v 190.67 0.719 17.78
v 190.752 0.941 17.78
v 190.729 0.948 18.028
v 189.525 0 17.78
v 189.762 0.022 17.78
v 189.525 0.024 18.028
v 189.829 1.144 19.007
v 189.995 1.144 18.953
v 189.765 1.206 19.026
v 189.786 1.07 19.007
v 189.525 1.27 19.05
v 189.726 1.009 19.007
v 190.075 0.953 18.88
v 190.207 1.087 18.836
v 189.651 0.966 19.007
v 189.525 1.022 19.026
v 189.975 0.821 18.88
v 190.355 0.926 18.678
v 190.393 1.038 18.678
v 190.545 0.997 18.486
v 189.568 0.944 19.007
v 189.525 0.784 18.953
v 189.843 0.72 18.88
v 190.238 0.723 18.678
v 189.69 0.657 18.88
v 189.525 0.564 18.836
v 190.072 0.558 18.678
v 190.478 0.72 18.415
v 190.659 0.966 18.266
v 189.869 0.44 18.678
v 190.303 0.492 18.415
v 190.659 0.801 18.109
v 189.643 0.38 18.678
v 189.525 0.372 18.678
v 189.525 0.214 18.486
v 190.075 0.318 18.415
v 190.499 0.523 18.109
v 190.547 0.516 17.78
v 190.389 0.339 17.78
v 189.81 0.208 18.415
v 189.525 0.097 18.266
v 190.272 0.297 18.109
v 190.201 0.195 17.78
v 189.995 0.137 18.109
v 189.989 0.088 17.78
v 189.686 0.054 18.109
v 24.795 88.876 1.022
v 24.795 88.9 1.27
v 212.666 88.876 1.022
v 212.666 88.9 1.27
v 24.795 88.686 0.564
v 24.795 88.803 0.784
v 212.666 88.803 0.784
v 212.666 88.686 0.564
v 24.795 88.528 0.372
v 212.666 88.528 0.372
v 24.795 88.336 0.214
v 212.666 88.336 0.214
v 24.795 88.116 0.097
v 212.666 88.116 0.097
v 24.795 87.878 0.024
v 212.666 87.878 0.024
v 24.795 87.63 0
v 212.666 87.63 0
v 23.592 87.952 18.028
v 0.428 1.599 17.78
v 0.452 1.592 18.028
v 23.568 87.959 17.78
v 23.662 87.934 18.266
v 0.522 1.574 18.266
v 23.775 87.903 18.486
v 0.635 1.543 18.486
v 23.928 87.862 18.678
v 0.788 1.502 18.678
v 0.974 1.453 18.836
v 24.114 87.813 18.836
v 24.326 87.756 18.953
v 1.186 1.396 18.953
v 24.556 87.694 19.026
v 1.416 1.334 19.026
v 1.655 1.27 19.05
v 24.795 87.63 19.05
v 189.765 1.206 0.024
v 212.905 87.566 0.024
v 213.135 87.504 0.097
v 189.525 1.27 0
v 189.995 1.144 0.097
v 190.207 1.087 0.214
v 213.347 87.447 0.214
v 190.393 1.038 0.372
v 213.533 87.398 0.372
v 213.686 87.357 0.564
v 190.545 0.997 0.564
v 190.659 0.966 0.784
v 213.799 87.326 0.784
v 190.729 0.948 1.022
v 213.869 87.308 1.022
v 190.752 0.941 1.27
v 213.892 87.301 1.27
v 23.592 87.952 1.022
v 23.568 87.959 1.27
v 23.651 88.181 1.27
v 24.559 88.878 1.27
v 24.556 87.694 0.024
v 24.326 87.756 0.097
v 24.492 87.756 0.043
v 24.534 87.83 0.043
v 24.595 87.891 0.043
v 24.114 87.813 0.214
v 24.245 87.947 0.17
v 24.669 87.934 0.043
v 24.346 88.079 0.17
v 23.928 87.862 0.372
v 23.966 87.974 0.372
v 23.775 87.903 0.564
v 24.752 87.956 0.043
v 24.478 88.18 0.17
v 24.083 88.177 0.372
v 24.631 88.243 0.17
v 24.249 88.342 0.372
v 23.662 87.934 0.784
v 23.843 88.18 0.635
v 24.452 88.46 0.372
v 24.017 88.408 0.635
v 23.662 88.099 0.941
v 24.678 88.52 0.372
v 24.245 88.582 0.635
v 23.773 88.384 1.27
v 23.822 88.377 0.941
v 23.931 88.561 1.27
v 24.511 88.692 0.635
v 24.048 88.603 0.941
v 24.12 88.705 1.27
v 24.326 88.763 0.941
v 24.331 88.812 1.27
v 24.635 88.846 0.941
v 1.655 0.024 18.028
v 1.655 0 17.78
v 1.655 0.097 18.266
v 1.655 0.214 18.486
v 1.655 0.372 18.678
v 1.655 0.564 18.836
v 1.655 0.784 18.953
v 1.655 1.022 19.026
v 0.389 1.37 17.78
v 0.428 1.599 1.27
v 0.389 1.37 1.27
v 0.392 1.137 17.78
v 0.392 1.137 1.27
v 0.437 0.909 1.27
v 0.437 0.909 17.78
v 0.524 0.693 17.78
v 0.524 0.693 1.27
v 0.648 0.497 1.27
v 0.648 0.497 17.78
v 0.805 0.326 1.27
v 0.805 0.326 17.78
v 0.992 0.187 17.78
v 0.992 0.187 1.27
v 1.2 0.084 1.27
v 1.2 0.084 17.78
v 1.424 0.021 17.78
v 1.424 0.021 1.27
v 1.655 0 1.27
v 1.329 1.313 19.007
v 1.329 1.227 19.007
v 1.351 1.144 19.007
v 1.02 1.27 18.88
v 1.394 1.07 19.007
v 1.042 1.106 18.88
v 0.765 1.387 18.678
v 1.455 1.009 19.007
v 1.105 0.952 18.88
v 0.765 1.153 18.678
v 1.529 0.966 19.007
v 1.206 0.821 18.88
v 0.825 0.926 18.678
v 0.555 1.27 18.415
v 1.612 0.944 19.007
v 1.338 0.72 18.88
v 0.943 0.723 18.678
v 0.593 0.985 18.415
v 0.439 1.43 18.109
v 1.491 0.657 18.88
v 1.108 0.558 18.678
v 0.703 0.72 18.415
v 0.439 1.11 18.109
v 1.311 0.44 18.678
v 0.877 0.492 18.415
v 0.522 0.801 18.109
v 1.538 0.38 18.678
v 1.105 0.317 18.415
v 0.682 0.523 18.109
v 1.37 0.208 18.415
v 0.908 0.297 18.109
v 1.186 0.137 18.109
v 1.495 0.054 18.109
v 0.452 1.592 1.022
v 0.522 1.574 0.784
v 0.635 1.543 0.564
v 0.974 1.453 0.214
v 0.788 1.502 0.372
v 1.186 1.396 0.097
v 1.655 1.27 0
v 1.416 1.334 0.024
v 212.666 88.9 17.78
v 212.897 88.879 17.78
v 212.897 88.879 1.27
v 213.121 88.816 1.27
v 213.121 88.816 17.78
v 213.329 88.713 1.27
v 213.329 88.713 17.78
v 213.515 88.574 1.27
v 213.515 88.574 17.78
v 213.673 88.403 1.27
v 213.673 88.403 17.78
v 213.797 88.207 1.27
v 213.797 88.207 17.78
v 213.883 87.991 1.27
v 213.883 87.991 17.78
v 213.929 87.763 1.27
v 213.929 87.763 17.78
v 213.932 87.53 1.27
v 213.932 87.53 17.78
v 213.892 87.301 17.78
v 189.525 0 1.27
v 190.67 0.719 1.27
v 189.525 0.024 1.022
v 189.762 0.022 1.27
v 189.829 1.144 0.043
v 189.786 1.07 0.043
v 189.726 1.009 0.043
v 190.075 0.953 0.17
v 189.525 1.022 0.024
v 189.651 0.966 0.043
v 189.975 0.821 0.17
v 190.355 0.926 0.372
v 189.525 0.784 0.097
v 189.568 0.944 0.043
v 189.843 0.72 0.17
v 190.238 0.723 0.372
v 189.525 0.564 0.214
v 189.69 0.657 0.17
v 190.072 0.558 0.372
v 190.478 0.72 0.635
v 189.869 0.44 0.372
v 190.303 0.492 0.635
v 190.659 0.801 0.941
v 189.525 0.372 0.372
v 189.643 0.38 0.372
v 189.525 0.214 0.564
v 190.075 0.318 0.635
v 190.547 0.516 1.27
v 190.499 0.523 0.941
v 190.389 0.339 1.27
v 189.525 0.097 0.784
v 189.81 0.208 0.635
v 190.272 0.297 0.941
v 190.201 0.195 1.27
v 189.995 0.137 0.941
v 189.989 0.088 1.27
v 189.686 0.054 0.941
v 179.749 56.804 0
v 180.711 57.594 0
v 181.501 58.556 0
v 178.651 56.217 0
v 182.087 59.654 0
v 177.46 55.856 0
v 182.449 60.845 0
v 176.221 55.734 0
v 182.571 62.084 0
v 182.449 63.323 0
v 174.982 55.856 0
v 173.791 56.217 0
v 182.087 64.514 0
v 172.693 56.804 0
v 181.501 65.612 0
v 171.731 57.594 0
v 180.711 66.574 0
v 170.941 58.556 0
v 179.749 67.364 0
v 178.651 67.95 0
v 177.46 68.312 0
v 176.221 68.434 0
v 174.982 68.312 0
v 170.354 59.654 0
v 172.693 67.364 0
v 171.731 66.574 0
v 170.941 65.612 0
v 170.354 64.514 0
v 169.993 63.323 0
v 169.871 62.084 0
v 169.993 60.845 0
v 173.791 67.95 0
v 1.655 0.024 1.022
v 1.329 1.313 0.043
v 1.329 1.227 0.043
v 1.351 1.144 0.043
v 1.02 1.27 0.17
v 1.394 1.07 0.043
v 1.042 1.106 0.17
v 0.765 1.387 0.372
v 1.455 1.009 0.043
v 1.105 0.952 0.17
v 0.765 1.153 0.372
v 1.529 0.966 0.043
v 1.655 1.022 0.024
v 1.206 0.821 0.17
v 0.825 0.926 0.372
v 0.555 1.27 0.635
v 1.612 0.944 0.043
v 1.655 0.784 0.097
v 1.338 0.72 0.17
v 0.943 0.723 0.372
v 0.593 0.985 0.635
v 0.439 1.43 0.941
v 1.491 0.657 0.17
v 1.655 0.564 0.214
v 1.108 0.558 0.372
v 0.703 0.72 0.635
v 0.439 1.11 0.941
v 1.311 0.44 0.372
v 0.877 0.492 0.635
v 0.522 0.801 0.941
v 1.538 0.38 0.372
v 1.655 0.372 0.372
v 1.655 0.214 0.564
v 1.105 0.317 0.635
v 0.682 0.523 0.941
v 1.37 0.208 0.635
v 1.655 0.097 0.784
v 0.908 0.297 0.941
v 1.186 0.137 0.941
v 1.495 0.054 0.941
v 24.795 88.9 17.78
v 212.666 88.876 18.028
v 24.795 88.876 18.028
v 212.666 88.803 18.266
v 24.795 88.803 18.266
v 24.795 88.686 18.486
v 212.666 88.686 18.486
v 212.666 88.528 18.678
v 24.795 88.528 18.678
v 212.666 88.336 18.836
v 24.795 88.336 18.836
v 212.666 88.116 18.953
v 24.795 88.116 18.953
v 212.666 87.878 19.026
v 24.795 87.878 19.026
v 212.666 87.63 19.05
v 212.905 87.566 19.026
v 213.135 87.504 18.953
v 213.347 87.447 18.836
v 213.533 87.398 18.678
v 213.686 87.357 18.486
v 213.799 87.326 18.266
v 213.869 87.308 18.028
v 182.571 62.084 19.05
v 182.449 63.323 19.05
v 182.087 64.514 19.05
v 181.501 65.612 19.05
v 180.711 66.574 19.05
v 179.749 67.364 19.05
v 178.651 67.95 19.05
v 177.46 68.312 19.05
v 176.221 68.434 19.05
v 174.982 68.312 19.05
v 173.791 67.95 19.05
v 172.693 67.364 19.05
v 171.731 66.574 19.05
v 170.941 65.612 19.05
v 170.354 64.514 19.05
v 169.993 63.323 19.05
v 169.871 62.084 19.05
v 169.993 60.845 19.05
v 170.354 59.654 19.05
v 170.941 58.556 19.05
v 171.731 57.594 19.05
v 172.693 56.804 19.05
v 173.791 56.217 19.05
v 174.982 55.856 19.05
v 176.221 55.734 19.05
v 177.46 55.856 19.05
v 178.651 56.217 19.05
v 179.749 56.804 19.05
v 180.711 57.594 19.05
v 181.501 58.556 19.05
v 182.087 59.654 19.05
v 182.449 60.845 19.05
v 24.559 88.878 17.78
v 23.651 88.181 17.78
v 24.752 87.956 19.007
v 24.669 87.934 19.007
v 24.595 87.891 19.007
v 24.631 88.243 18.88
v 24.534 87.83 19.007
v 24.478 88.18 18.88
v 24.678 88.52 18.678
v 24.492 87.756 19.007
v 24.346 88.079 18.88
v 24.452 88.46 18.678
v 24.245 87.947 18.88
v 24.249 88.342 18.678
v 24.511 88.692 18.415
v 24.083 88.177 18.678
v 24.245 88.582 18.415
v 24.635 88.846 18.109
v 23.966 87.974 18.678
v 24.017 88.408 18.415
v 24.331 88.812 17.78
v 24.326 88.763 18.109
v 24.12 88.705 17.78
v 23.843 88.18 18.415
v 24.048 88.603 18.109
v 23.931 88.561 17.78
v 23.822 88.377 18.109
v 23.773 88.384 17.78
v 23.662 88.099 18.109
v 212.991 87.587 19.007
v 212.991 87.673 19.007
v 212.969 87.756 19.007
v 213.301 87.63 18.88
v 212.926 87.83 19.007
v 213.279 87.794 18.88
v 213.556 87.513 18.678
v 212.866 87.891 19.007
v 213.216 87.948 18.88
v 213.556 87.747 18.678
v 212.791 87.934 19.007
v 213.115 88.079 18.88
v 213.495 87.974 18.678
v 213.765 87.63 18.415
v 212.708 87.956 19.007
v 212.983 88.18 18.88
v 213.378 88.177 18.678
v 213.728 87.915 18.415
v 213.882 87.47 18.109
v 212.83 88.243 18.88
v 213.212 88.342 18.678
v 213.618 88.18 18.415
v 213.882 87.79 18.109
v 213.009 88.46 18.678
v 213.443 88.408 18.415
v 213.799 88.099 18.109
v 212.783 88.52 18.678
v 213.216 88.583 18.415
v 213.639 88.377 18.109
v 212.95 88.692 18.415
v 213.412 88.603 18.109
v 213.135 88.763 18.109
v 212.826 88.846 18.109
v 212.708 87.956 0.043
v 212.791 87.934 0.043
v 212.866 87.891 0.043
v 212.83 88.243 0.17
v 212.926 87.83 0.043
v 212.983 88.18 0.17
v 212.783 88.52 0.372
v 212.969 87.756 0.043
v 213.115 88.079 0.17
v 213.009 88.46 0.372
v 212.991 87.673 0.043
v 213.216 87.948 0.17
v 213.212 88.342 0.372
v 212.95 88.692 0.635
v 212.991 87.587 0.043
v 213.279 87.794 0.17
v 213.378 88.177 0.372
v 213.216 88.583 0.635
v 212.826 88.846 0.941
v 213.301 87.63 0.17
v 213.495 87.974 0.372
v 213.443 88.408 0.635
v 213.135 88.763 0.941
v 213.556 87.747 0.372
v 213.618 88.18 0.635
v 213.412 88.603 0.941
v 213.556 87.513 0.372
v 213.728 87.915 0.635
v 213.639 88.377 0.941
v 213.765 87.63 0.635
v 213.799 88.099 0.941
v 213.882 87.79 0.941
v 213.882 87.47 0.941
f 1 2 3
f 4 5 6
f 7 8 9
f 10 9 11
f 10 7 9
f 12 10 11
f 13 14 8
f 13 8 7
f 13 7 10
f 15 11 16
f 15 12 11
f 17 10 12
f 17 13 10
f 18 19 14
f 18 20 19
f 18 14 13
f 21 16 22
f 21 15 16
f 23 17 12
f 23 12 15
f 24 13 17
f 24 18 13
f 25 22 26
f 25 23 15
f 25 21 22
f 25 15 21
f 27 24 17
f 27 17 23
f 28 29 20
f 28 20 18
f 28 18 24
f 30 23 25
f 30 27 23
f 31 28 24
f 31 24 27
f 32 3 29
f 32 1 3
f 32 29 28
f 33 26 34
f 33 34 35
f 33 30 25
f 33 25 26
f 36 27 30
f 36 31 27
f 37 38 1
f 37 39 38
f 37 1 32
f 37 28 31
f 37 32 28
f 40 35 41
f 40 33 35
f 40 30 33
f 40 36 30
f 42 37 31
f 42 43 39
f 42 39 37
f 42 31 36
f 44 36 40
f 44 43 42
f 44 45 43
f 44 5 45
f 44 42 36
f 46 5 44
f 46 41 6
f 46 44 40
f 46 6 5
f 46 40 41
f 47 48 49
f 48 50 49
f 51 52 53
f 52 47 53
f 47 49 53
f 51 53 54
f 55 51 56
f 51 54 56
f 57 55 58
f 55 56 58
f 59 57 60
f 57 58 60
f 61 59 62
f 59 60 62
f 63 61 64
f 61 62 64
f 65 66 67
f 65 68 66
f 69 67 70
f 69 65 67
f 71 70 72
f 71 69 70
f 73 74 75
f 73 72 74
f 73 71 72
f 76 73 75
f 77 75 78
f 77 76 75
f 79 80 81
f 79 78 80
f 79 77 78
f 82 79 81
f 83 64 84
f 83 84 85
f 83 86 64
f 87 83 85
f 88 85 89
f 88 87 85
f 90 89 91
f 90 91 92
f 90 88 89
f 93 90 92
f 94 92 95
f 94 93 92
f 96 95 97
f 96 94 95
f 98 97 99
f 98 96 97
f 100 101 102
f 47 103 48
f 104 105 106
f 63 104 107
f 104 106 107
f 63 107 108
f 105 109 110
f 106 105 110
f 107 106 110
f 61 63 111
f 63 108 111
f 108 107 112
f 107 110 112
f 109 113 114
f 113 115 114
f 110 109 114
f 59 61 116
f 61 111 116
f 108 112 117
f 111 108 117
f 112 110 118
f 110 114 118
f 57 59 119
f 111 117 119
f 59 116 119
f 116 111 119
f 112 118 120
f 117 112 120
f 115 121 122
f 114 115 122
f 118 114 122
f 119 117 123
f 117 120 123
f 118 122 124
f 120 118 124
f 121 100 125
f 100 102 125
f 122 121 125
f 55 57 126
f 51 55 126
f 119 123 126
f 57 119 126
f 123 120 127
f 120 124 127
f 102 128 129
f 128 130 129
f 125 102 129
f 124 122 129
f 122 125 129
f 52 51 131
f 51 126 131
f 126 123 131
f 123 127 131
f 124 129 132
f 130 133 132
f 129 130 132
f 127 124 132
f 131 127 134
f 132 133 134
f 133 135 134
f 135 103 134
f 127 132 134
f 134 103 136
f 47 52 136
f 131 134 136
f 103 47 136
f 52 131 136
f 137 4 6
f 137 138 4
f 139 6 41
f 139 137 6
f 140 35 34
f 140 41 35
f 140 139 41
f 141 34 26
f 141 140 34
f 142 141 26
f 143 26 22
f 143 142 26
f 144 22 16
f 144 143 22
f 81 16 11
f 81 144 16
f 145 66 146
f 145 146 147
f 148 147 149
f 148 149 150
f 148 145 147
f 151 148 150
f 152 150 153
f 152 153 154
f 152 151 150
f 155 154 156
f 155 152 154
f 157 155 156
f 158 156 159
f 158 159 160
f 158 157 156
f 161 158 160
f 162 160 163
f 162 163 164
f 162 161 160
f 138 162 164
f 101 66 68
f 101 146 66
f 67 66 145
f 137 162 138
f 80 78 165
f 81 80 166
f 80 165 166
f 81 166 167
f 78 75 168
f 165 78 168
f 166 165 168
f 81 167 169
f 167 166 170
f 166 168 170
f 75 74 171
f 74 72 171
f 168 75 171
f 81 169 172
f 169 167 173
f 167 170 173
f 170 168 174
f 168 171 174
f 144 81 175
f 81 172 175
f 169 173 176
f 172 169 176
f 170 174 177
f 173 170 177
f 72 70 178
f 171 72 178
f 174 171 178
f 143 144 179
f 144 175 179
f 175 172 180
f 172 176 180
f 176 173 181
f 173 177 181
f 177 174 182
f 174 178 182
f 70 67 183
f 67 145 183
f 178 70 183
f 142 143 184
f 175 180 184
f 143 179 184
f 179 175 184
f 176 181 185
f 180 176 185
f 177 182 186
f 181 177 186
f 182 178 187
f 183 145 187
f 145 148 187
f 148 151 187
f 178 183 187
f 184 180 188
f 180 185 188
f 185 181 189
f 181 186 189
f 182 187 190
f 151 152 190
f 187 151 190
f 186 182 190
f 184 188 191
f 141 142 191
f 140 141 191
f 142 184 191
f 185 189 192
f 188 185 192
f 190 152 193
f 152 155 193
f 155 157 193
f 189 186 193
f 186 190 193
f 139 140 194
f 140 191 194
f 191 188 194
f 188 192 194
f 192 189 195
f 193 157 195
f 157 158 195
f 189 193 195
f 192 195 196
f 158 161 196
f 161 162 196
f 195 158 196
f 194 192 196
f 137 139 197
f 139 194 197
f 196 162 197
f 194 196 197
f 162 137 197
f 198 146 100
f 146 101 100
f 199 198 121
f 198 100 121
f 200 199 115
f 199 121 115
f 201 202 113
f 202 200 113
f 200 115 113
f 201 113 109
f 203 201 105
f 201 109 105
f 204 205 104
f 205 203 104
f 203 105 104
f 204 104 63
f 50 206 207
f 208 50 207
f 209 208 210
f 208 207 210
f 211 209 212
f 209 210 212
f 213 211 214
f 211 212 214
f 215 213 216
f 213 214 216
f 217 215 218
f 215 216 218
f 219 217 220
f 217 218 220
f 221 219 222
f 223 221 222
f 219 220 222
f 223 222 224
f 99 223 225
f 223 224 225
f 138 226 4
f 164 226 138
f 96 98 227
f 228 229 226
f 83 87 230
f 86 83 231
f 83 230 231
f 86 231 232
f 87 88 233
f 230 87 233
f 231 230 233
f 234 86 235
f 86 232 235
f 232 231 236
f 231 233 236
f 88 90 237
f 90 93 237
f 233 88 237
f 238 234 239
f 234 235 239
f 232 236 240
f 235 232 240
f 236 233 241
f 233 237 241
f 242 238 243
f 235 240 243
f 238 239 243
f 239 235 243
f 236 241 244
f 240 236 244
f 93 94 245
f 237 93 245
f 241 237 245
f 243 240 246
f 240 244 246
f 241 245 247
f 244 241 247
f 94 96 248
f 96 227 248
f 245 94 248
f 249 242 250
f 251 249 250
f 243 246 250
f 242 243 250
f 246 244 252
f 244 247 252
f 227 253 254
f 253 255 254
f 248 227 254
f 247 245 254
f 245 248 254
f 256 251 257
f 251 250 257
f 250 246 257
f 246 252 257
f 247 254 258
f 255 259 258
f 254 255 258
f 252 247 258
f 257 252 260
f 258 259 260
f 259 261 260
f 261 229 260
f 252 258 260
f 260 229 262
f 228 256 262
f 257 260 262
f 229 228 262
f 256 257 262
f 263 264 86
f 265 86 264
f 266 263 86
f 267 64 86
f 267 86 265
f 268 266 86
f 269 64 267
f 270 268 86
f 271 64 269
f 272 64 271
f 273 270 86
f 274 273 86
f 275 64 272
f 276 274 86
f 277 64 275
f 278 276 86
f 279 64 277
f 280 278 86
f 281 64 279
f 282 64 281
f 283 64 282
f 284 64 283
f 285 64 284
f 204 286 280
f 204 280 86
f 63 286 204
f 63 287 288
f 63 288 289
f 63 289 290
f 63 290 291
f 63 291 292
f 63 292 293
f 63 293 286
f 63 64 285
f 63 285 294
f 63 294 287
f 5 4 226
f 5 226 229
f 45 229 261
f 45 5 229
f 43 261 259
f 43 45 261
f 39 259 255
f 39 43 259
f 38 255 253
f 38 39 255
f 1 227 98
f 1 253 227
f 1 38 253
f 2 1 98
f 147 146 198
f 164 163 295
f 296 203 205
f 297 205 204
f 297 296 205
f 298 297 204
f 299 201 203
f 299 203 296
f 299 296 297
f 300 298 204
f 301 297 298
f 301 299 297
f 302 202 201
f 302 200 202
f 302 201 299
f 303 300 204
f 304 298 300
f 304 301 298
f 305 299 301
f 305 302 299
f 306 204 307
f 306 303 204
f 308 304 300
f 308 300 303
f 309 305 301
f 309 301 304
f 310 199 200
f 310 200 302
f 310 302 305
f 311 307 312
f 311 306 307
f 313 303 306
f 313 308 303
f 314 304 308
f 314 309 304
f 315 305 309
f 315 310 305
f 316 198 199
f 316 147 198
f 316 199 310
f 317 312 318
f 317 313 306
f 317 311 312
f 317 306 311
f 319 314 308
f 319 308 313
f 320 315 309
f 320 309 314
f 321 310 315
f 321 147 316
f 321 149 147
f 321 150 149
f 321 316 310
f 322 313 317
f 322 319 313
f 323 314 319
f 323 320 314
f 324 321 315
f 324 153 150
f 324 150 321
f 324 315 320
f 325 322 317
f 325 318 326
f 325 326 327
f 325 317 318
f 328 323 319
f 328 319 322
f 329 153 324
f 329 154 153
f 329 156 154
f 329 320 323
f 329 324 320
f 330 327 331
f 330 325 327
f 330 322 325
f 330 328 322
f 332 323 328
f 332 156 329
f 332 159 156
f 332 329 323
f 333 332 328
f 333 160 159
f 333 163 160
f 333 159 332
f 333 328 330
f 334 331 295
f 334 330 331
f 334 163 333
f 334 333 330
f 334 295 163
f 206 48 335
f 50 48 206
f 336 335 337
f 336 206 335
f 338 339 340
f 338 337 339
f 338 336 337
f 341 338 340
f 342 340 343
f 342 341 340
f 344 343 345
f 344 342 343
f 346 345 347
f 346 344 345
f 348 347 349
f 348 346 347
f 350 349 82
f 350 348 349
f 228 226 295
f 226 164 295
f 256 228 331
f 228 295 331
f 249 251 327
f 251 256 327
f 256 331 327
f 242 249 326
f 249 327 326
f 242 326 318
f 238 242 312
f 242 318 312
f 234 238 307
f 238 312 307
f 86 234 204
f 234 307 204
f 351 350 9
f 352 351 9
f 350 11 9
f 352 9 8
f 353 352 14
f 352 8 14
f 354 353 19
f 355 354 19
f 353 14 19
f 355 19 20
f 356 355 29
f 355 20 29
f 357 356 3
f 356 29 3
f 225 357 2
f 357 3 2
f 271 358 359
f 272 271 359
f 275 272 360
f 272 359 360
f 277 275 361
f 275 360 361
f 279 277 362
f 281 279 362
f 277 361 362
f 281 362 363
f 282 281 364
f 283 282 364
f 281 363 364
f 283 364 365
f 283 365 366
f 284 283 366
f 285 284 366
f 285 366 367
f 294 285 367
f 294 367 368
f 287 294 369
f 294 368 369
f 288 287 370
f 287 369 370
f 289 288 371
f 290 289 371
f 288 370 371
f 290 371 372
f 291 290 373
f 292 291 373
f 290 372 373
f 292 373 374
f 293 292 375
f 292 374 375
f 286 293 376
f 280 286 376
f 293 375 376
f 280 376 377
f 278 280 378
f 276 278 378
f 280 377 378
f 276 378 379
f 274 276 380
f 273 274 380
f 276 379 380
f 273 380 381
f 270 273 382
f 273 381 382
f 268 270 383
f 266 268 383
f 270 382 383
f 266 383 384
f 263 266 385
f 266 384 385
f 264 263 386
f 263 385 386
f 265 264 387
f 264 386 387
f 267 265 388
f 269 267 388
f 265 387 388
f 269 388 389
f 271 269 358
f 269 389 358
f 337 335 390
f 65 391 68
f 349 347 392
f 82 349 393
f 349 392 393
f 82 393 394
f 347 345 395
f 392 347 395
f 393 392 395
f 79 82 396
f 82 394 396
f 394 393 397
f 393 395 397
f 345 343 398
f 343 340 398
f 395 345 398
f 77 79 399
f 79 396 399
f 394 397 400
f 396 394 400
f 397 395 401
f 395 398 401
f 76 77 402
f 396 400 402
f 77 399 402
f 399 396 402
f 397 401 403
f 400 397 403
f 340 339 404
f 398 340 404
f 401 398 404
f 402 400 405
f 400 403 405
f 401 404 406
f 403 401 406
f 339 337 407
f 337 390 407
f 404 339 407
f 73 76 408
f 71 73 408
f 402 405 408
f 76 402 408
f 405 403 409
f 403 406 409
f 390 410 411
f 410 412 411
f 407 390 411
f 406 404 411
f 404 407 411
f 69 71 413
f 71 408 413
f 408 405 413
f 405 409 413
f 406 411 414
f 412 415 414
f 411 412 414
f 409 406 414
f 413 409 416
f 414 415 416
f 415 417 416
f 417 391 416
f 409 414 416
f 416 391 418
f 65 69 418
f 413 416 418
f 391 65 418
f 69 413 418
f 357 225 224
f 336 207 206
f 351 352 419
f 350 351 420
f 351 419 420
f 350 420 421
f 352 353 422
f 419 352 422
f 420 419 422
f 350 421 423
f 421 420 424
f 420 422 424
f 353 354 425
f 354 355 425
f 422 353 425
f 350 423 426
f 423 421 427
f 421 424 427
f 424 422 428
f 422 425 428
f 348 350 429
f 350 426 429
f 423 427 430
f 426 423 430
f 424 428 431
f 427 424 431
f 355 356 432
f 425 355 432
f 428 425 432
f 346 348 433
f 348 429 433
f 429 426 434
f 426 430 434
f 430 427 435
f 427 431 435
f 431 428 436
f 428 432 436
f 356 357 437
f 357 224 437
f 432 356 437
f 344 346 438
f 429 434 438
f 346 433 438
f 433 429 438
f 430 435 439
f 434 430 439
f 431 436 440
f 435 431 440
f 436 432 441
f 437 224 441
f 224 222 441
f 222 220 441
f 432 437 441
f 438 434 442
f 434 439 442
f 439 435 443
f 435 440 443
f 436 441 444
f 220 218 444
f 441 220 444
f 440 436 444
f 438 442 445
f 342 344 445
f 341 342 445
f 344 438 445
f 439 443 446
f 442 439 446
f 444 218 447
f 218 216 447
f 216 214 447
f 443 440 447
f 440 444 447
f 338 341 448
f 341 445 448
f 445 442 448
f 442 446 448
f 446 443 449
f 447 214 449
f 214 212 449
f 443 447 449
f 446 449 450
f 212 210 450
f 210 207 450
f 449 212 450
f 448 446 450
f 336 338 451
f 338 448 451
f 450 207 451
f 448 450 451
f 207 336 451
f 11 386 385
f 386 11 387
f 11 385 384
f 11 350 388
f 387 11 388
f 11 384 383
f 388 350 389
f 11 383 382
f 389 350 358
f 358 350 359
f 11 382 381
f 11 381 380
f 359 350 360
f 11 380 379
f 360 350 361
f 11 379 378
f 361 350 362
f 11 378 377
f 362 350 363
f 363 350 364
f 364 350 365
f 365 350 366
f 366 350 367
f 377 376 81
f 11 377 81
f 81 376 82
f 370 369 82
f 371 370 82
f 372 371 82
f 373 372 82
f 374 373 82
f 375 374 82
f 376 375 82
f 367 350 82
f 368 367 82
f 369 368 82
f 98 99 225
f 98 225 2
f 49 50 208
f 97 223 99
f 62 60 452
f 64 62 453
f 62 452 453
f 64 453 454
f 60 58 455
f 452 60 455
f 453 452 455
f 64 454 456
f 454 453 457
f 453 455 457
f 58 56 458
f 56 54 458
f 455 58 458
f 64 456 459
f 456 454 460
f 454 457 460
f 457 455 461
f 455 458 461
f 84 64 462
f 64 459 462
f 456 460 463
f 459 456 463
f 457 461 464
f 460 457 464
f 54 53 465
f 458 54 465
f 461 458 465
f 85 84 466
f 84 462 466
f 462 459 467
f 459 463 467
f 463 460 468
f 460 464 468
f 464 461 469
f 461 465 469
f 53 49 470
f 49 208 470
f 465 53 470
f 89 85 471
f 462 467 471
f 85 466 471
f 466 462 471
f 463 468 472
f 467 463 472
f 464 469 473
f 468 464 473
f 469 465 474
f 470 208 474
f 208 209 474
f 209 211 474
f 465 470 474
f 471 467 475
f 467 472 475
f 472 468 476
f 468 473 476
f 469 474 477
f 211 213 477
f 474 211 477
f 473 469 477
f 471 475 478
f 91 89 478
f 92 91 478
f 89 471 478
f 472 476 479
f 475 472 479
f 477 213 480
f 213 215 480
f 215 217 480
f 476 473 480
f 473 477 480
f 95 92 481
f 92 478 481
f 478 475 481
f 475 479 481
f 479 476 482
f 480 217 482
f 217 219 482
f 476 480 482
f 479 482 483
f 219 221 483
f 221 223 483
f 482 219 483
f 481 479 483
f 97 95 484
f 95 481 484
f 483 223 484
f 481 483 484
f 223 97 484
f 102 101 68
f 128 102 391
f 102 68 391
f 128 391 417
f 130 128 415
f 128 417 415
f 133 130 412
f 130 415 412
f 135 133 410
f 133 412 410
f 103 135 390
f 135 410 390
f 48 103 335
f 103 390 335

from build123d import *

# Parameters (mm, degrees)
BOSS_EXTRUDE1_DEPTH = 19.05
SKETCH2_R           = 6.35
CUT_EXTRUDE1_DEPTH  = 19.05
FILLET1_R           = 1.27


with BuildPart() as part:
    # Sketch1 → Boss-Extrude1 (new body)
    with BuildSketch(Plane.XY):
        Polygon((0, 0), (23.820683207, 88.9), (214.320683207, 88.9), (190.5, 0), align=None)
    extrude(amount=BOSS_EXTRUDE1_DEPTH)

    # Sketch2 → Cut-Extrude1 (cut)
    with BuildSketch(Plane.XY.offset(19.05)):
        with Locations((176.220683207, 62.083789013)):
            Circle(SKETCH2_R)
    extrude(amount=-CUT_EXTRUDE1_DEPTH, mode=Mode.SUBTRACT)

    # Fillet1
    fillet1_edges = [part.edges().sort_by_distance(p)[0] for p in [
        (119.070683207, 88.9, 19.05),
        (11.910341604, 44.45, 19.05),
        (95.25, 0, 19.05),
        (11.910341604, 44.45, 0),
        (119.070683207, 88.9, 0),
        (202.410341604, 44.45, 0),
        (95.25, 0, 0),
        (0, 0, 9.525),
        (23.820683207, 88.9, 9.525),
        (214.320683207, 88.9, 9.525),
        (190.5, 0, 9.525),
        (202.410341604, 44.45, 19.05),
    ]]
    fillet(fillet1_edges, radius=FILLET1_R)


solid = part.part
